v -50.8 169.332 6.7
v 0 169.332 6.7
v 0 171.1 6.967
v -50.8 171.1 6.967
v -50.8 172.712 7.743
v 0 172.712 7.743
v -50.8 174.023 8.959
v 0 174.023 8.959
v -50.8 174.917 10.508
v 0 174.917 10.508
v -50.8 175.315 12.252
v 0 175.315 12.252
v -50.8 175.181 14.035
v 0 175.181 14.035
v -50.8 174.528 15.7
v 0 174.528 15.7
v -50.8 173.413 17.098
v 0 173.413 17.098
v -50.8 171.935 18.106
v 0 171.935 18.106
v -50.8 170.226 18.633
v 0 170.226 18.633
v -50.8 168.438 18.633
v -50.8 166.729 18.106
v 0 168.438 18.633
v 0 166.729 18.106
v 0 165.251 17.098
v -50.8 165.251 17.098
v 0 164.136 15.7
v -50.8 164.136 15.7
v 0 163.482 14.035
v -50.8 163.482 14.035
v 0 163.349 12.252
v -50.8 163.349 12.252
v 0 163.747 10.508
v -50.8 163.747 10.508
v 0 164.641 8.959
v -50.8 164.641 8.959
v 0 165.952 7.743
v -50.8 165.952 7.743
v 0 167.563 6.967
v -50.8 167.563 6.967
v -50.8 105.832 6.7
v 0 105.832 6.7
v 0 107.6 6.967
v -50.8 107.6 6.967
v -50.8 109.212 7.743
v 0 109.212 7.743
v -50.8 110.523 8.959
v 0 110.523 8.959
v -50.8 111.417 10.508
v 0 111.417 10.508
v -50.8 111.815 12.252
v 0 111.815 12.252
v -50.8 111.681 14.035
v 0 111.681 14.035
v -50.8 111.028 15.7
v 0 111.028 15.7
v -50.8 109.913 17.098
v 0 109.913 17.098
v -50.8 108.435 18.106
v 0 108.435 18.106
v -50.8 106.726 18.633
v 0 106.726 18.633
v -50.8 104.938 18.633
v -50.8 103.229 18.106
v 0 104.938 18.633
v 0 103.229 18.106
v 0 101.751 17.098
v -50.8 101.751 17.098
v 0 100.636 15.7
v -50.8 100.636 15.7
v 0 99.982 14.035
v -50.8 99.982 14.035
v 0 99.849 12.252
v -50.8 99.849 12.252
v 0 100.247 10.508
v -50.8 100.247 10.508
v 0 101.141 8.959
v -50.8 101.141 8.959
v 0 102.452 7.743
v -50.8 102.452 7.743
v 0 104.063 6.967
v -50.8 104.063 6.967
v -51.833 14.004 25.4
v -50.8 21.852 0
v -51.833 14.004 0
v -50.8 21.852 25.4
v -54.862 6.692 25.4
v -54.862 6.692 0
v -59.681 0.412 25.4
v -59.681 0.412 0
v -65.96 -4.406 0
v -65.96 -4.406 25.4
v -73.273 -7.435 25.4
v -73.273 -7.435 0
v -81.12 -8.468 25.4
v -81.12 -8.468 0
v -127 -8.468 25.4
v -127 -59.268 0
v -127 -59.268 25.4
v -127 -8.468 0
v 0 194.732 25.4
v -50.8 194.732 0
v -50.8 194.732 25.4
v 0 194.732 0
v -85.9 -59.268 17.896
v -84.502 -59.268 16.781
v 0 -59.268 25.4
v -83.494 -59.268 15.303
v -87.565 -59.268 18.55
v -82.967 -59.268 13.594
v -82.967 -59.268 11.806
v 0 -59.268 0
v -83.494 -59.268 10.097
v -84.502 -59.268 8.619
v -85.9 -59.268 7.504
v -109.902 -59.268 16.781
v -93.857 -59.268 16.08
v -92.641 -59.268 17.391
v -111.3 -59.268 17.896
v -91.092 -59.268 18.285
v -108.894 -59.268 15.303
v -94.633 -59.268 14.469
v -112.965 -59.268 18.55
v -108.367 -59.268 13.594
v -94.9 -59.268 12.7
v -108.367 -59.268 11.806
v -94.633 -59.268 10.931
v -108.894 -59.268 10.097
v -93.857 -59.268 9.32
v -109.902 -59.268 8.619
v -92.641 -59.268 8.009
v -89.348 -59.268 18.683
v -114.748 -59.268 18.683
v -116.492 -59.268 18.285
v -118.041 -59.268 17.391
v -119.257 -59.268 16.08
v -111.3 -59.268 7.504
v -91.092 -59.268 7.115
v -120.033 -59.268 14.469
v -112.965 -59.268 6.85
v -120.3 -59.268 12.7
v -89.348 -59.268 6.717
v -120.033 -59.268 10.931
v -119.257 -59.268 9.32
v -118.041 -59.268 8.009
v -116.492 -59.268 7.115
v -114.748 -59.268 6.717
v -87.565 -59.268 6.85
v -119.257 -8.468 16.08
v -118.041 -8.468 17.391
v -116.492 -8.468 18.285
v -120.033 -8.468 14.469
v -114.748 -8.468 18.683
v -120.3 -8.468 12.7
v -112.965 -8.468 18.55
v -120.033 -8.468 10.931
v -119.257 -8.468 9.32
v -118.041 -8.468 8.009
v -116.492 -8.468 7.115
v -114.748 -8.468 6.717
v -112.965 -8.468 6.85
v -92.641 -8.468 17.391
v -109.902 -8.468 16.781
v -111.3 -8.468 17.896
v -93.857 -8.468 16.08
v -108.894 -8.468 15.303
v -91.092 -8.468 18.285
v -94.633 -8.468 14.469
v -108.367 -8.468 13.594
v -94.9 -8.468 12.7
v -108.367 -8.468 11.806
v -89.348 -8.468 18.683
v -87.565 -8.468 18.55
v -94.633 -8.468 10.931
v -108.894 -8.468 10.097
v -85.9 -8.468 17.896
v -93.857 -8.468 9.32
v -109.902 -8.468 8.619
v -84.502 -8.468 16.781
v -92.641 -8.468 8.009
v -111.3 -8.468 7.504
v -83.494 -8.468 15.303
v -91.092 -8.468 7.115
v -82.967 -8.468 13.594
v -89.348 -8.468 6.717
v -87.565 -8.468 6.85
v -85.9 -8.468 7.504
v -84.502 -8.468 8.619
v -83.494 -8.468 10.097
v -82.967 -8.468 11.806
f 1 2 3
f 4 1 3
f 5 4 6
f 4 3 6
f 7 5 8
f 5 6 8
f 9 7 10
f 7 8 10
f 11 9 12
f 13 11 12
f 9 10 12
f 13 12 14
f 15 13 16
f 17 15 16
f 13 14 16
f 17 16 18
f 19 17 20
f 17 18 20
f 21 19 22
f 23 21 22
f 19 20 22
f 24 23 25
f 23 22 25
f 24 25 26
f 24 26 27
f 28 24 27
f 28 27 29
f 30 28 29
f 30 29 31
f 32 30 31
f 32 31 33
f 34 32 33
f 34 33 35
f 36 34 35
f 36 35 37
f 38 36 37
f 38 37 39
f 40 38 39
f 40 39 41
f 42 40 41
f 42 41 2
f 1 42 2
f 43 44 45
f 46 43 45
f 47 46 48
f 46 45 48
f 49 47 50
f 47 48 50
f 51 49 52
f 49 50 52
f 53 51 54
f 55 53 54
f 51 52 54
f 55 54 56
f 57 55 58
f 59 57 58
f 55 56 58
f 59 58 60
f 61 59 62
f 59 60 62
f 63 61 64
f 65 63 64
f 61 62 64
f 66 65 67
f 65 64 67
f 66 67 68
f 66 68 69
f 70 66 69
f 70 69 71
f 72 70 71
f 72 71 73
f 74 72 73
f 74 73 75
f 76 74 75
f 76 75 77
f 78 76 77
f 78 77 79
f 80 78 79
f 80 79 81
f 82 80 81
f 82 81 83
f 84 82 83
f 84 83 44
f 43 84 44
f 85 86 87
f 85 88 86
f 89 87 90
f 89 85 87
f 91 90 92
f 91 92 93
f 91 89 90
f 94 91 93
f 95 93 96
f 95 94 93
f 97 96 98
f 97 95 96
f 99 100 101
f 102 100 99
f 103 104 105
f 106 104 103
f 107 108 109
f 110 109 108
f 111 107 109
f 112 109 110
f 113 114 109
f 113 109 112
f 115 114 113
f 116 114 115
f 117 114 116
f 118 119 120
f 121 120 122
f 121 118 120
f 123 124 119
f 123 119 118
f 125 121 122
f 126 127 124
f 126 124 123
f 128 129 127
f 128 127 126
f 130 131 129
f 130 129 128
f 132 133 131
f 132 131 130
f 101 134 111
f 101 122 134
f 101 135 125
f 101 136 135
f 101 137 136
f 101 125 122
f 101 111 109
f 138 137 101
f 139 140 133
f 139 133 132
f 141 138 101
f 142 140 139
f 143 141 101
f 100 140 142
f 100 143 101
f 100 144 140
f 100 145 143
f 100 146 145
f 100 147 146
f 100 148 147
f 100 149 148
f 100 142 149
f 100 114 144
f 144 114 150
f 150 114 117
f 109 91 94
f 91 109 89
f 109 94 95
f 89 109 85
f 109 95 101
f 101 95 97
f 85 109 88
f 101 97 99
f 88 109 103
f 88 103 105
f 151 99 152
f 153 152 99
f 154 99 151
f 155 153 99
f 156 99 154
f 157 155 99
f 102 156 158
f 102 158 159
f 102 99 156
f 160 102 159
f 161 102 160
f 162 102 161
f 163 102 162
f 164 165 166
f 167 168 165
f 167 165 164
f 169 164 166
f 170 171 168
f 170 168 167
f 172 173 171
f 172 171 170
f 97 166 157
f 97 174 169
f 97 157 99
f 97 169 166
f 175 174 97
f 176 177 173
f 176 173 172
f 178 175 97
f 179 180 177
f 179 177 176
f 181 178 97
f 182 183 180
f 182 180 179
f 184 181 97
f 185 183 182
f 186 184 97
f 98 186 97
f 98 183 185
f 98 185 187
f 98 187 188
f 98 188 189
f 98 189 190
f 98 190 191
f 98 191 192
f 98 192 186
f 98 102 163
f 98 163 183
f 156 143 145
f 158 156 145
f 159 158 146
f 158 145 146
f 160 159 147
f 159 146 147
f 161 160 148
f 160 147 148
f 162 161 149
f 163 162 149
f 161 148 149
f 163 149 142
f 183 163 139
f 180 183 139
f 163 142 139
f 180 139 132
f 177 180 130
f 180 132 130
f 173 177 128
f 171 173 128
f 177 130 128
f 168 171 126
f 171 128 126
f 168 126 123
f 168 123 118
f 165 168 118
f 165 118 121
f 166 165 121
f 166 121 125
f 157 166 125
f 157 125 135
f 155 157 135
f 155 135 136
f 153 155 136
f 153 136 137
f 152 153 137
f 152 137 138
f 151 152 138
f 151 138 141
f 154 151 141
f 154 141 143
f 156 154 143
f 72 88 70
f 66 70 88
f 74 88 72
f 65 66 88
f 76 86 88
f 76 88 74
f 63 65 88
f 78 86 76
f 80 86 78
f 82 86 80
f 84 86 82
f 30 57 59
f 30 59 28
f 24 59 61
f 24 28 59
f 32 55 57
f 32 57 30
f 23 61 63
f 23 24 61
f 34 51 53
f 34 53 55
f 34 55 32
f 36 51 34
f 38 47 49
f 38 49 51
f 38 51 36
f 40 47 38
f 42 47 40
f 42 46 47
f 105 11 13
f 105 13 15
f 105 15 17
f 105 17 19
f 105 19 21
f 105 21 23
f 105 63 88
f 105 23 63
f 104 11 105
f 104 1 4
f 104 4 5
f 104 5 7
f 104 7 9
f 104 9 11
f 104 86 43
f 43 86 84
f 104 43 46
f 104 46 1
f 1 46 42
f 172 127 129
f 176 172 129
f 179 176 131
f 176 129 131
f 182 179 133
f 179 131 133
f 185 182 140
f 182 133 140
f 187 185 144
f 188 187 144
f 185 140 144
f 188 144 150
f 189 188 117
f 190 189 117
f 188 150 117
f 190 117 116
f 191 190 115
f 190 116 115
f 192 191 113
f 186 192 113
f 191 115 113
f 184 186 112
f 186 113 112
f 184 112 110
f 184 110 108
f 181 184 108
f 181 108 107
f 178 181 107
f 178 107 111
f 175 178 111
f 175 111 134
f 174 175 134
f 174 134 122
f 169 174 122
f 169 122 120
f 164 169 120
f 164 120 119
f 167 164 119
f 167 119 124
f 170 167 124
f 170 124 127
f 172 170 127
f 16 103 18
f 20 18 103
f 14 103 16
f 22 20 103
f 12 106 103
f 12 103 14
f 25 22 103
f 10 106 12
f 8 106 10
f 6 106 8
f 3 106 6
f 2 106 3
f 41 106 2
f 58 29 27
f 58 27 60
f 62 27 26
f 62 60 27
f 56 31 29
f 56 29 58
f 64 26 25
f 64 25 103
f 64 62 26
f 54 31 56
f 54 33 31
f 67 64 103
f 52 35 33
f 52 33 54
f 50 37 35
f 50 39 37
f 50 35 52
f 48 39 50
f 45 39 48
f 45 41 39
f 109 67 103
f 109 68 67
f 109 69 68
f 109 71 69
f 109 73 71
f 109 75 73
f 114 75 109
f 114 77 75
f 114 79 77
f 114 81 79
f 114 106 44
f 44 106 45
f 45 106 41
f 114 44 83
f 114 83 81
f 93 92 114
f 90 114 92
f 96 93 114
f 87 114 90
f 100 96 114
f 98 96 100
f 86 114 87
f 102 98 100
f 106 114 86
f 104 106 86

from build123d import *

# Parameters (mm, degrees)
BOSS_EXTRUDE1_DEPTH   = 25.4
M10_CLEARANCE_HOLE1_D = 12
M10_CLEARANCE_HOLE2_D = 12
FILLET1_R             = 30.32


with BuildPart() as part:
    # Sketch1 → Boss-Extrude1 (new body)
    with BuildSketch(Plane.XY):
        Polygon((0, 194.731808123), (0, -59.268191877), (-127, -59.268191877), (-127, -8.468191877), (-50.8, -8.468191877), (-50.8, 194.731808123), align=None)
    extrude(amount=BOSS_EXTRUDE1_DEPTH)

    # M10 Clearance Hole1 (through all)
    with Locations(Plane(origin=(0, -8.468191877, 0), x_dir=(1, 0, 0), z_dir=(0, 1, 0))):
        with Locations((-114.3, -12.7), (-88.9, -12.7)):
            Hole(M10_CLEARANCE_HOLE1_D / 2)

    # M10 Clearance Hole2 (through all)
    with Locations(Plane.ZY.offset(50.8)):
        with Locations((12.7, 169.331808123), (12.7, 105.831808123)):
            Hole(M10_CLEARANCE_HOLE2_D / 2)

    # Fillet1
    fillet1_edges = [part.edges().sort_by_distance(p)[0] for p in [
        (-50.8, -8.468191877, 12.7),
    ]]
    fillet(fillet1_edges, radius=FILLET1_R)


solid = part.part
